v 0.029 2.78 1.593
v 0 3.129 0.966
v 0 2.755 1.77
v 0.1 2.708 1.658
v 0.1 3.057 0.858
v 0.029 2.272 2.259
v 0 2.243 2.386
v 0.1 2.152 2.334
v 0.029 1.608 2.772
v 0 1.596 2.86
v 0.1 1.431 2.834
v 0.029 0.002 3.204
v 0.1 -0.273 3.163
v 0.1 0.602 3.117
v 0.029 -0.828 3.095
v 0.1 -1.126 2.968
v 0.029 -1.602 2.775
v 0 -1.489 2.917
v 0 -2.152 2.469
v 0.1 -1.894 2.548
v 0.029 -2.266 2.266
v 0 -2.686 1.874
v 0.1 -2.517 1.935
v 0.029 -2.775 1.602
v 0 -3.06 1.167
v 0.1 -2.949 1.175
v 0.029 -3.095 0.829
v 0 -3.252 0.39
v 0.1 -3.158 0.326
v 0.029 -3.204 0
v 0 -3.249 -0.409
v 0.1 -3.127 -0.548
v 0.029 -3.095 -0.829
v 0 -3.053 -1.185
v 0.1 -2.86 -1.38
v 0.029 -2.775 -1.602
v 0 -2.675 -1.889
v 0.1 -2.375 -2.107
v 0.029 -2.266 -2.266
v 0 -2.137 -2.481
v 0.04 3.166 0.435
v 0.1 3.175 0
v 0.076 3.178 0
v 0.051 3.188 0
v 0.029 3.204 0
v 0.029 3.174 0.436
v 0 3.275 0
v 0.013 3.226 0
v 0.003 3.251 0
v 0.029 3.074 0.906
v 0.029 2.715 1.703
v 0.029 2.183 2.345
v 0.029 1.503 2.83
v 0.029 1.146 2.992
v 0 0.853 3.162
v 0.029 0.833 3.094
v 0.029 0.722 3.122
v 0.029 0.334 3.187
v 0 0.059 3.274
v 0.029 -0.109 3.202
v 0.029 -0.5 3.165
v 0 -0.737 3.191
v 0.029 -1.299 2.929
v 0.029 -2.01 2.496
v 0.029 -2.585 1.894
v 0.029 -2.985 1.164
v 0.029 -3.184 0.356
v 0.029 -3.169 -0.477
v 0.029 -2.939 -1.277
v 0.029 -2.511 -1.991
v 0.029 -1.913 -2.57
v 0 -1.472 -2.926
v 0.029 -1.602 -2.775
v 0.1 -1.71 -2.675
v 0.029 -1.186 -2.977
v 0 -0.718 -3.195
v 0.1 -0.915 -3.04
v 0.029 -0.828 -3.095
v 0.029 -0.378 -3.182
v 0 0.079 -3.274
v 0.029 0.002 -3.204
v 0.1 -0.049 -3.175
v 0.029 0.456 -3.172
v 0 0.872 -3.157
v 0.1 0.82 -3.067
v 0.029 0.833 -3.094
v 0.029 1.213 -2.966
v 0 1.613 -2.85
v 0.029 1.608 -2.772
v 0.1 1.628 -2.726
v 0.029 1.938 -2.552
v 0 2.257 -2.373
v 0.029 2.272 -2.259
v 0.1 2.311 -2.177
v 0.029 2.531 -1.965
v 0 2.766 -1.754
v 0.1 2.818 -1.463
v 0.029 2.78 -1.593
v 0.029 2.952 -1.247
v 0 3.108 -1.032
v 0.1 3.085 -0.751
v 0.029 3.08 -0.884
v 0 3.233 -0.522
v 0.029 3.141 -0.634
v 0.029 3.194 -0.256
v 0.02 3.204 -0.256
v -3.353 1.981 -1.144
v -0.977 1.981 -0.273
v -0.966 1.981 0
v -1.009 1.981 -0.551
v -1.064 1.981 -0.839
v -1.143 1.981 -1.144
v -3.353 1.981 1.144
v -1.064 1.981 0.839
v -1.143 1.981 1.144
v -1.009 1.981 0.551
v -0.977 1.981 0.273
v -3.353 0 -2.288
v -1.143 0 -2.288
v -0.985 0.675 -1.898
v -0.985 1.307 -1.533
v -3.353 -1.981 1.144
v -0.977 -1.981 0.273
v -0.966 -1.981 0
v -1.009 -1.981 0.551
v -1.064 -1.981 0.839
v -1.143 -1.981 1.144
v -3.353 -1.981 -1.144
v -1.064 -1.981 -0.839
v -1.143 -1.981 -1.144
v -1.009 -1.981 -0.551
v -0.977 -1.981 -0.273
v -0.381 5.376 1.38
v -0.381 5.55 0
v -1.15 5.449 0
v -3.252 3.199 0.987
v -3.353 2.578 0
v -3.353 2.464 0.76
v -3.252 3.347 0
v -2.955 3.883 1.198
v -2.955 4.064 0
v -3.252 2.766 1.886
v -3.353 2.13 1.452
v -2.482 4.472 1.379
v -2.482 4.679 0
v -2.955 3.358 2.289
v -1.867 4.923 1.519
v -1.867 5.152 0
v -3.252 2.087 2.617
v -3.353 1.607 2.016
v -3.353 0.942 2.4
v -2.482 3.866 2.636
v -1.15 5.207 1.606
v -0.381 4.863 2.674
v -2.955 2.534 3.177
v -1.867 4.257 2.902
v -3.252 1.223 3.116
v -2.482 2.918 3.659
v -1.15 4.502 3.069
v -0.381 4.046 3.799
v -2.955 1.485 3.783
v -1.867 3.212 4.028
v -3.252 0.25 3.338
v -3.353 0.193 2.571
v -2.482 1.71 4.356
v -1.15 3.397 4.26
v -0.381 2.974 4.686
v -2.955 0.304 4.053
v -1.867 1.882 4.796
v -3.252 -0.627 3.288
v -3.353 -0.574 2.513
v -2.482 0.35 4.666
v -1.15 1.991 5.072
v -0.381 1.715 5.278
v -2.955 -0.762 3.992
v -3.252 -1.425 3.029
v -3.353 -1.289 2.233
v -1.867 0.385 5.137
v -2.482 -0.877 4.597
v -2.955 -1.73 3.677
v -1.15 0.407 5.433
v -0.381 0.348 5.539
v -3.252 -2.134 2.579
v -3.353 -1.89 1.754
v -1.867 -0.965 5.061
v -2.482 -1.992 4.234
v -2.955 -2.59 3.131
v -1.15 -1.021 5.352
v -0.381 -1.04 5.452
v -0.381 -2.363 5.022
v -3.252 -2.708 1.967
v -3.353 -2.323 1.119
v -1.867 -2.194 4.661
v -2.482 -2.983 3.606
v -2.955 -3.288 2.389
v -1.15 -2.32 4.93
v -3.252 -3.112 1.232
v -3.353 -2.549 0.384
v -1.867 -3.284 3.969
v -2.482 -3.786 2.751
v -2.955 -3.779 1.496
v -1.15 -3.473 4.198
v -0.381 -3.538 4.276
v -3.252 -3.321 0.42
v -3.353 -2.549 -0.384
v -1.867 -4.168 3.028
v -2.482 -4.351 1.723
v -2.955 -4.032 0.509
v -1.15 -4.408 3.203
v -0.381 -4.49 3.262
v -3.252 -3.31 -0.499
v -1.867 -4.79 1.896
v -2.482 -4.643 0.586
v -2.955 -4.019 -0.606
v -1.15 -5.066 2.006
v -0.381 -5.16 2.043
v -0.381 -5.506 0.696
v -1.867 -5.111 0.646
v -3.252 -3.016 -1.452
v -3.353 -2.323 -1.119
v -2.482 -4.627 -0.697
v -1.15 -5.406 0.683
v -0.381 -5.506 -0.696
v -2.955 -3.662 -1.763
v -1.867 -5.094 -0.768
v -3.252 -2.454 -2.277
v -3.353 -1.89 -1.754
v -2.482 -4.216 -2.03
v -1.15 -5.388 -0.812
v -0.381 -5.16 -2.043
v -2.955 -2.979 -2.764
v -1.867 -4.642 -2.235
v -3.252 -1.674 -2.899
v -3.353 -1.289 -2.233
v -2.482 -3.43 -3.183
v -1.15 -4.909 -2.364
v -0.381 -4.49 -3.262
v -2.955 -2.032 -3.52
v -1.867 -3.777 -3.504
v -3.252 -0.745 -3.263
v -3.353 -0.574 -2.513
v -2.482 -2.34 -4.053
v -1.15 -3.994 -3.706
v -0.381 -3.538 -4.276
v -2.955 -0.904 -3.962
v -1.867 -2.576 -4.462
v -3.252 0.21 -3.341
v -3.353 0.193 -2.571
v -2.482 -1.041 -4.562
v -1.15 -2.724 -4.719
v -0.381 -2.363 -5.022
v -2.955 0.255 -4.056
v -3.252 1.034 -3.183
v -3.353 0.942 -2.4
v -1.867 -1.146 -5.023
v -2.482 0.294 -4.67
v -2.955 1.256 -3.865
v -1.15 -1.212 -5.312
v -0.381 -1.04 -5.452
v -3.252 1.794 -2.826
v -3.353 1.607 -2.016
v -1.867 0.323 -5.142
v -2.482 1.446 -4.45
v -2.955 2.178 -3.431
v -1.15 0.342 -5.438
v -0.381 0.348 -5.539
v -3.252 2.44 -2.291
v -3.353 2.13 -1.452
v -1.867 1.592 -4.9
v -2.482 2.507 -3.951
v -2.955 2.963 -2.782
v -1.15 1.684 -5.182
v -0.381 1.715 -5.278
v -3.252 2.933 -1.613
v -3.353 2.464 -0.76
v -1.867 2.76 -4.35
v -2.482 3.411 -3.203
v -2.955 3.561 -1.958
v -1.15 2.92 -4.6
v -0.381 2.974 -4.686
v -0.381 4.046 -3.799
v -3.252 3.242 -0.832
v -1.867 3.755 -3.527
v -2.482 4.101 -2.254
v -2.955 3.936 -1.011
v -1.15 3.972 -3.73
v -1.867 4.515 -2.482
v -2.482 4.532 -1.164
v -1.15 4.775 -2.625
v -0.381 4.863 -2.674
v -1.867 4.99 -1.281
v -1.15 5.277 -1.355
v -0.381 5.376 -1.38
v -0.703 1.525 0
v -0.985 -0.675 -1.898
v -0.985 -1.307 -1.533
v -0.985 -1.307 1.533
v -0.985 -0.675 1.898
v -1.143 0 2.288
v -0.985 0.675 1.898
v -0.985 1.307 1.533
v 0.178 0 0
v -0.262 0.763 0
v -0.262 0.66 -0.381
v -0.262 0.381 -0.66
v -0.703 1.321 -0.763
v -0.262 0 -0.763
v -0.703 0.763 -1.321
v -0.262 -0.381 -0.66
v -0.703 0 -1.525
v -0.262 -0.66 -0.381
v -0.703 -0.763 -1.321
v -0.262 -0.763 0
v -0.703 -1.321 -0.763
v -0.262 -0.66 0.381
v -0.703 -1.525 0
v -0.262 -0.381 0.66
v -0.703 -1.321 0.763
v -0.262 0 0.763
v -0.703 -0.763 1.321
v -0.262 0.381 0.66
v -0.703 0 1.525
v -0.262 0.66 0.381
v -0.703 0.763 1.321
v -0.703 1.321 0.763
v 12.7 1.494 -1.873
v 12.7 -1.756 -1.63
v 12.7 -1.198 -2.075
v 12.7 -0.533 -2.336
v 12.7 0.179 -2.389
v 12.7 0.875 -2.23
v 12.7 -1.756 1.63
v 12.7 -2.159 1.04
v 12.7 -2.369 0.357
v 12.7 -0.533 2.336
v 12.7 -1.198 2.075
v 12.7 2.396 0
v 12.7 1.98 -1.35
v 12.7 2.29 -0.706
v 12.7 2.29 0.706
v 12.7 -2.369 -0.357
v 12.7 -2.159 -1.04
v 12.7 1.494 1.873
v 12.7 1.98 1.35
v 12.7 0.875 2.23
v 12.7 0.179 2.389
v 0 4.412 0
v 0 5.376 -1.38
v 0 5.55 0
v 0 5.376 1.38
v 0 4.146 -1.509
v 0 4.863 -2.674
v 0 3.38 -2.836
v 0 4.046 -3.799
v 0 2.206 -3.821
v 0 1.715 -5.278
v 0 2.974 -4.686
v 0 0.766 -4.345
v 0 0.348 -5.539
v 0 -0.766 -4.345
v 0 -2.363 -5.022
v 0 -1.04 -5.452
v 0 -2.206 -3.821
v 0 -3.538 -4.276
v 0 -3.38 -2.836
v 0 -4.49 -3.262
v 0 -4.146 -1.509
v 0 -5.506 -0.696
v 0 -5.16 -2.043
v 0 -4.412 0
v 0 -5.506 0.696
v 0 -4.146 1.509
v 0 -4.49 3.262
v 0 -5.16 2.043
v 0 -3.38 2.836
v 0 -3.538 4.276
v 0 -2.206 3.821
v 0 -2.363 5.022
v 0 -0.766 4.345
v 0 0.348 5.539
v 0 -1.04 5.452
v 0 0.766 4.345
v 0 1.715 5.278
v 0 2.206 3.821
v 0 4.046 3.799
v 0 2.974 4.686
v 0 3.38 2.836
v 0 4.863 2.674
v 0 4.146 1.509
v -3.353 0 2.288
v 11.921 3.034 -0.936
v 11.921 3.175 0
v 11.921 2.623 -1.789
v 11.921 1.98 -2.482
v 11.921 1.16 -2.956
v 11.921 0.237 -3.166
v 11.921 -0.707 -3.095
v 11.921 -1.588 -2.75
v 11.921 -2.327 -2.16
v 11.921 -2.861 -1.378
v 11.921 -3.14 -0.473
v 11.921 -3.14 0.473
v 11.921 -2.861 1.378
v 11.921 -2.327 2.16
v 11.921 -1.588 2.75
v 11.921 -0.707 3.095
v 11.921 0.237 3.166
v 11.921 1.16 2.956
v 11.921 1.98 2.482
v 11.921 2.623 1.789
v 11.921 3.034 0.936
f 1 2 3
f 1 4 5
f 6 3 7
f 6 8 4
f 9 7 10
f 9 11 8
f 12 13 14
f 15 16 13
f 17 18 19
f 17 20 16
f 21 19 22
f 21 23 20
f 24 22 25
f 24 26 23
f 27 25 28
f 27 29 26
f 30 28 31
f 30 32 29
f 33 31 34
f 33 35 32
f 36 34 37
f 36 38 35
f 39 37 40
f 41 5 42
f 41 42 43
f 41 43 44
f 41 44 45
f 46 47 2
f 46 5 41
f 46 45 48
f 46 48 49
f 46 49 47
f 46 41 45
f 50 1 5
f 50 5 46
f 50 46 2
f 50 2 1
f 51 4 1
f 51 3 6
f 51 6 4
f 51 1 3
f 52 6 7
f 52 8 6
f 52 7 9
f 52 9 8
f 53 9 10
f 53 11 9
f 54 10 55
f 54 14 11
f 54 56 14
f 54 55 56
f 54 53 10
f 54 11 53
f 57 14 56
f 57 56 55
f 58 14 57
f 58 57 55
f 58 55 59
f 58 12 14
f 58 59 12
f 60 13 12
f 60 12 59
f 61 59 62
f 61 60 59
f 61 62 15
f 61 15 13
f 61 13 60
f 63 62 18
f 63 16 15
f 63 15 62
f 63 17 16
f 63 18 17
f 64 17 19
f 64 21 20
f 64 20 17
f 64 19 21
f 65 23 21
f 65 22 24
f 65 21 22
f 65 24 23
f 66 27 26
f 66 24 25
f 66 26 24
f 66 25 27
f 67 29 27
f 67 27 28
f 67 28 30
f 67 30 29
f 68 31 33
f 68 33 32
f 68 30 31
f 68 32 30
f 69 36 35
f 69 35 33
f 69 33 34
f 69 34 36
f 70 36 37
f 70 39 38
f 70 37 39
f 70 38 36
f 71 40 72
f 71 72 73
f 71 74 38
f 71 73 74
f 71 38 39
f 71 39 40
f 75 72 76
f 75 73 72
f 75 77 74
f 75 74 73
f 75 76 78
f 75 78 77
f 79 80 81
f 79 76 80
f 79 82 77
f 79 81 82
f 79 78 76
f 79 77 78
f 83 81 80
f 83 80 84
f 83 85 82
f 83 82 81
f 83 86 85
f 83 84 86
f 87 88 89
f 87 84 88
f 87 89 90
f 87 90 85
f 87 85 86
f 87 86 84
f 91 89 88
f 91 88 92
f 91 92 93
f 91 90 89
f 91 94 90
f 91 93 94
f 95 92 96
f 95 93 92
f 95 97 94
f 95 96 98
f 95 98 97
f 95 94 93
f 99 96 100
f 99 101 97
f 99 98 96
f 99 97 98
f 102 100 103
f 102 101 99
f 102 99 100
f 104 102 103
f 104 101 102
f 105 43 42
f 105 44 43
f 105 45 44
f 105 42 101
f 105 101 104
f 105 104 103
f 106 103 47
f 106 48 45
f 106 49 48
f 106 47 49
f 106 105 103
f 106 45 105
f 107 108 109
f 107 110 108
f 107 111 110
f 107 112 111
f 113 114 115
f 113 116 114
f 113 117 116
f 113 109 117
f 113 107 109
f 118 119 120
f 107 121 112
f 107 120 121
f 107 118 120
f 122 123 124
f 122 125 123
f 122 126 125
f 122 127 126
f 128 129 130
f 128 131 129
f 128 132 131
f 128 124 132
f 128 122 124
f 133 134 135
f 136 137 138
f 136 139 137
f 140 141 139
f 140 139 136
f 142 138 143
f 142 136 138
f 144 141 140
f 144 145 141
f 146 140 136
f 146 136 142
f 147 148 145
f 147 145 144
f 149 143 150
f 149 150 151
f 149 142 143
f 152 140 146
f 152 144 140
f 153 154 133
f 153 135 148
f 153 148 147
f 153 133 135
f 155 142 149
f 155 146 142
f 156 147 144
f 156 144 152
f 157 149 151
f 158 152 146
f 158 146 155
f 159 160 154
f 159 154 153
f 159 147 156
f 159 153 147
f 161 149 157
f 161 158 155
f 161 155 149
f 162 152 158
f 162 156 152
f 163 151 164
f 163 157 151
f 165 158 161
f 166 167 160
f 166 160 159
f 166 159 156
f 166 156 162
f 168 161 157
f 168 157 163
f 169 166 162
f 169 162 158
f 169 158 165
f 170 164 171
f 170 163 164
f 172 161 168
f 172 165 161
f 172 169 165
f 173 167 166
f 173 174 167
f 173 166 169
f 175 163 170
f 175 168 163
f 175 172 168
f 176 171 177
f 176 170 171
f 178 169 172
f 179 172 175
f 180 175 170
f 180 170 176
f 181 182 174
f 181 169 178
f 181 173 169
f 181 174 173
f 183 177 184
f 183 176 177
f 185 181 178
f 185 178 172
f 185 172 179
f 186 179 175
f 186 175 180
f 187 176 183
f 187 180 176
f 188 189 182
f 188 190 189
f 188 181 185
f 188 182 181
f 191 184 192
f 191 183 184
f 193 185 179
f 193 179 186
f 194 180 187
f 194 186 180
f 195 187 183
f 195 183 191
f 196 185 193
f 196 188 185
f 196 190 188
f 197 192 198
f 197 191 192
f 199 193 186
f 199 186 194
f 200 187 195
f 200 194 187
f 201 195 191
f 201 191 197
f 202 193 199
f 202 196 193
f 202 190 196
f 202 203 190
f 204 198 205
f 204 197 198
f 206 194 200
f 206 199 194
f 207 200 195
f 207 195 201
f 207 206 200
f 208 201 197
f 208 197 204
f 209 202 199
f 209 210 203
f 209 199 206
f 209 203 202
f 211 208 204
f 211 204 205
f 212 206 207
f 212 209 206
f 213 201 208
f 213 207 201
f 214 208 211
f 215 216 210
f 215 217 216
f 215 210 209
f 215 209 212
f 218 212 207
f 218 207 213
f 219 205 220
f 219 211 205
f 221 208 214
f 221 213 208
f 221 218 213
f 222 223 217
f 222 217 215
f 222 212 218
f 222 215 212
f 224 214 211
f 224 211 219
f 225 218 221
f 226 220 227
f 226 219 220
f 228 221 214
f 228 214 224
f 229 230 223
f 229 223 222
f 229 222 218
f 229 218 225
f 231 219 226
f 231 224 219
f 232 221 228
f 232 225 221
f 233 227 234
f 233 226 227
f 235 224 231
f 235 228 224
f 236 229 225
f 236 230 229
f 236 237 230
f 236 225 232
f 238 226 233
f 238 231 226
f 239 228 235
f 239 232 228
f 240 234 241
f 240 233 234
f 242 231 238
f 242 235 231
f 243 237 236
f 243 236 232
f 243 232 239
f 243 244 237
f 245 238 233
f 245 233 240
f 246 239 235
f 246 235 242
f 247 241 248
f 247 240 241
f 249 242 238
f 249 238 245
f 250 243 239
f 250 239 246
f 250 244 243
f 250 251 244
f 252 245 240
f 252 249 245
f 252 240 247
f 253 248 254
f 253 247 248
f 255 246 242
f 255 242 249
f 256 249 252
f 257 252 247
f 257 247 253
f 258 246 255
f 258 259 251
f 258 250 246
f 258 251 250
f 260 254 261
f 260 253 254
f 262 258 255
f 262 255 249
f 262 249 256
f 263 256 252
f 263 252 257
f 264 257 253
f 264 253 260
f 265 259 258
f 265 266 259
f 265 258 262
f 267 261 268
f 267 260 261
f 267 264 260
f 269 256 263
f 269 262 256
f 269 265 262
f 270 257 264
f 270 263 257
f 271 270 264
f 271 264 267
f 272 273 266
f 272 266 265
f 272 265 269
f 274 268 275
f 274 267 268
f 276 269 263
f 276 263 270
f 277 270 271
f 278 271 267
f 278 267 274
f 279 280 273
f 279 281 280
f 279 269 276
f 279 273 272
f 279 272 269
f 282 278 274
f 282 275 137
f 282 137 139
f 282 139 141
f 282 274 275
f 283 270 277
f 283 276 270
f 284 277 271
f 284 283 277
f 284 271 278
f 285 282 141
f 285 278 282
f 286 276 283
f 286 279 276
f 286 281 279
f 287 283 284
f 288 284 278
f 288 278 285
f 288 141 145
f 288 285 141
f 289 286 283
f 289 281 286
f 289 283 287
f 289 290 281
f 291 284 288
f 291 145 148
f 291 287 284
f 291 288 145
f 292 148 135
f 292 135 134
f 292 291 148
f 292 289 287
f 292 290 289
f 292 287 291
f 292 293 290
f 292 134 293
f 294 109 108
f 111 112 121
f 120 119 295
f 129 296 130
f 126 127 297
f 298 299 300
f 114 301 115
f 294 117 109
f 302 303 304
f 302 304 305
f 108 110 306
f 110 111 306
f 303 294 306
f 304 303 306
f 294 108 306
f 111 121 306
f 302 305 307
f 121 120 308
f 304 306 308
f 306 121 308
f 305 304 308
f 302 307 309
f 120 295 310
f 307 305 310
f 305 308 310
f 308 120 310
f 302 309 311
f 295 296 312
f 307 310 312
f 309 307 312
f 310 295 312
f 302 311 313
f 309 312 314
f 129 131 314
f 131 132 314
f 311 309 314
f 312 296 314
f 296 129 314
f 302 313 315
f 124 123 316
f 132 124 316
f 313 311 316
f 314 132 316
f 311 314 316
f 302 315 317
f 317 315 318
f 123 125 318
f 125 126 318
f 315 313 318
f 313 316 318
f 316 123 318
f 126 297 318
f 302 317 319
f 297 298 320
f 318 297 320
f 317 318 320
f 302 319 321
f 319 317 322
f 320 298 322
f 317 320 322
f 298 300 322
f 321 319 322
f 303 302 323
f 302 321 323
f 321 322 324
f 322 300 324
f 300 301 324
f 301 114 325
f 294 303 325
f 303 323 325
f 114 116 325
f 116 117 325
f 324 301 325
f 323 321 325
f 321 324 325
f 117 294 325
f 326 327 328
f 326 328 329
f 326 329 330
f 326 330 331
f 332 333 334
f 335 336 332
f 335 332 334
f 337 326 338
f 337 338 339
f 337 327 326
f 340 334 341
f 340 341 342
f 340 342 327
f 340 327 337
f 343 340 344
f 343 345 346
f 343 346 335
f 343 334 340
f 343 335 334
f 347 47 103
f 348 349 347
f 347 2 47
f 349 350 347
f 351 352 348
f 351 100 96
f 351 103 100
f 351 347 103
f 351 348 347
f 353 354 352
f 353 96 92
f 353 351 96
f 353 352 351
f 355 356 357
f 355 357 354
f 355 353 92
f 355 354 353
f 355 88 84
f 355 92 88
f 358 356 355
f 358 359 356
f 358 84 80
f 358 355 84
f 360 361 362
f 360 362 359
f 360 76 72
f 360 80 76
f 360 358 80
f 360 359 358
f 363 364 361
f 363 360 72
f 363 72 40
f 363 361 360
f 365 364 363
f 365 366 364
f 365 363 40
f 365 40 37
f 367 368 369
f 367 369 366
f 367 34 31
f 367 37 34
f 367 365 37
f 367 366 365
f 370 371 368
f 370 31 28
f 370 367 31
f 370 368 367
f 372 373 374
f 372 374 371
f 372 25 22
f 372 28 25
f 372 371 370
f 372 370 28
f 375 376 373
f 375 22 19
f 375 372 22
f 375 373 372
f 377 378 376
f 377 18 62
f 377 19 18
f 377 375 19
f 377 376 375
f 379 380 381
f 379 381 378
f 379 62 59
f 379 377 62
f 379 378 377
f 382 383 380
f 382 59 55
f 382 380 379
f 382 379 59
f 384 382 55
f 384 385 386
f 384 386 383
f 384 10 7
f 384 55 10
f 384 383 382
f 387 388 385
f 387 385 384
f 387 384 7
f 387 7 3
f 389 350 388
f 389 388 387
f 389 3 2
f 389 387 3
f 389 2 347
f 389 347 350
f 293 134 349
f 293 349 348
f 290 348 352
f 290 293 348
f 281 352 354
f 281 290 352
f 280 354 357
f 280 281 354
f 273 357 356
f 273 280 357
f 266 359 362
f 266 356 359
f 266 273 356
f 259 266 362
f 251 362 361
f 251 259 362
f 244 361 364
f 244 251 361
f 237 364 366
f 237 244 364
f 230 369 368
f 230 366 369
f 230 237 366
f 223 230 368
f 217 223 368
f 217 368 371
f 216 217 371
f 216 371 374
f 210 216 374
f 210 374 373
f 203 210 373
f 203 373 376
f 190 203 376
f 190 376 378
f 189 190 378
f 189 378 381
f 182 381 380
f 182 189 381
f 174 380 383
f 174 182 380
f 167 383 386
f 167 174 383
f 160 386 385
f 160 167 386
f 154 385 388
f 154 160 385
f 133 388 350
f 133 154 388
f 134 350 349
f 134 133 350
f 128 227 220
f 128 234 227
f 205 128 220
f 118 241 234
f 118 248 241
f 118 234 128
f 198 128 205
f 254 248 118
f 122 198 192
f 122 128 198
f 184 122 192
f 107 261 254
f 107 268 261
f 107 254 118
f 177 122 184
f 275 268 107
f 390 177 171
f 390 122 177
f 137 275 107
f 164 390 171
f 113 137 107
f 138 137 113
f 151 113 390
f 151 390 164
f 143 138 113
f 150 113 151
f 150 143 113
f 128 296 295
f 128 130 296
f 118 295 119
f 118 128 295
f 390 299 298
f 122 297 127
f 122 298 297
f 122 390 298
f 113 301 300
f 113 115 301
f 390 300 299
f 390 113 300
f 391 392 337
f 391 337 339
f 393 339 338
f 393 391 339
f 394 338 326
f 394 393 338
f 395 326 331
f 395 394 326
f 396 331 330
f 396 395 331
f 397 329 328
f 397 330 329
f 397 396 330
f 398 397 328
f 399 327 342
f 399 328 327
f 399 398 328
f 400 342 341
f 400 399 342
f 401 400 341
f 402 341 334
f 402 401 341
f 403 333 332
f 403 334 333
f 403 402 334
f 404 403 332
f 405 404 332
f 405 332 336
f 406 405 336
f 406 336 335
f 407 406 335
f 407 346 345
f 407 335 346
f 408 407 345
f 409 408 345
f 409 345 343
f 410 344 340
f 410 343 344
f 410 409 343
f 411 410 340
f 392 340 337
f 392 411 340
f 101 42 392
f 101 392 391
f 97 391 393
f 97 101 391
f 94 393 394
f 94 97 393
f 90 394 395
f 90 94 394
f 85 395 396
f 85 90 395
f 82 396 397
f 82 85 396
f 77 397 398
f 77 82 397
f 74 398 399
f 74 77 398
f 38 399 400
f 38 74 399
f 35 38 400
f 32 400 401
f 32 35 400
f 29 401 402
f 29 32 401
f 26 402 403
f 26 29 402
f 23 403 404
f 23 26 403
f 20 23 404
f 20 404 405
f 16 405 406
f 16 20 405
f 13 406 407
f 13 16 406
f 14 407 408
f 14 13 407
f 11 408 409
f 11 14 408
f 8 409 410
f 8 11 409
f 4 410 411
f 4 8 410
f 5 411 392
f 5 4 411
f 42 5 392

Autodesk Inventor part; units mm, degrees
ref_plane "YZ Plane" through (0, 0, 0) normal (1, 0, 0) x (0, 1, 0)
ref_plane "XZ Plane" through (0, 0, 0) normal (0, 1, 0) x (-1, 0, 0)
sketch "Sketch1" plane through (0, 0, 0) normal (0, 0, 1) x (1, 0, 0)
  line L0 (0.1778, 0) -> (12.7, 0)
  line L1 (12.7, 0) -> (12.7, 3.175)
  line L2 (12.7, 3.175) -> (2.5402, 3.175)
  line L3 (2.5402, 3.175) -> (0.0001, 3.175)
  line L4 (0.0001, 3.175) -> (0, 3.175)
  line L5 (0, 3.175) -> (0, 5.5499)
  line L6 (0, 5.5499) -> (-3.3528, 5.5499)
  line L7 (-3.3528, 5.5499) -> (-3.3528, 2.2877)
  line L8 (-3.3528, 2.2877) -> (-1.143, 2.2877)
  line L9 (-1.143, 2.2877) -> (0.1778, 0)
  line L10 (-6.5634, 0) -> (15.9106, 0) projected
  line L11 (0, -1.11) -> (0, 6.6599) projected
  line L12 (2.5402, 3.175) -> (0, 3.175) construction
  dimension "d1" = 10.1598
  dimension "d2" = 2.5401
  dimension "d3" = 3.3528
  dimension "d4" = 2.2098
  dimension "d5" = 60
  dimension "d6" = 6.35
  dimension "d7" = 6.35
  dimension "d8" = 4.5754
  dimension "d9" = 11.0998
  dimension "d26" = 12.7
revolve "Body" add sketch "Sketch1" angle 360 about axis through (0.1778, 0, 0) along (1, 0, 0) contours L9 L11 L3 L2 L1 L0 | L9 L8 L7 L6 L5 L11
sketch "Sketch2" plane through (-3.3528, 0, 0) normal (-1, 0, 0) x (0, 0, 1)
  circle A0 centre (0, 0) radius 2.2877 projected
  line L0 (0, -7.7699) -> (0, 7.7699) projected
  line L1 (-7.7699, 0) -> (7.7699, 0) projected
  line L2 (2.2877, 0) -> (1.1438, -1.9812)
  line L3 (1.1438, -1.9812) -> (-1.1438, -1.9812)
  line L4 (-1.1438, -1.9812) -> (-2.2877, 0)
  line L5 (-2.2877, 0) -> (-1.1438, 1.9812)
  line L6 (-1.1438, 1.9812) -> (1.1438, 1.9812)
  line L7 (1.1438, 1.9812) -> (2.2877, 0)
  point P0 (0, 0)
extrude "Slot" add sketch "Sketch2" against normal up to next contours L7 A0 | A0 L2 | L6 L0 A0 | A0 L0 L3 | L0 L6 A0 | A0 L3 L0 | L4 A0 | A0 L5
fillet "Fillet1" radius 2.9718 1 edges at (-3.3528, -5.5499, 0)
thread "Thread" size "1/4-20 UNC" class "2A" standard "ANSI Unified Screw Threads" length 10.1598
chamfer "Chamfer1" distance 0.779 distance2 0.779 1 edges at (12.7, -3.175, 0) measured on face at (12.7, -1.2091, -0.9896)
ref_plane "Work Plane1" through (29, 0, 0) normal (0, -1, 0) x (1, 0, 0)
fillet "Fillet2" radius 0.1 1 edges at (0.0001, -3.175, 0)
equation "\"d1\" = GEL"
equation "\"d3\" = KOH"
equation "\"d4\" = INTI"
equation "\"d6\" = GD"
equation "\"d7\" = BDM"
equation "\"d8\" = 1.1547 * SW"
equation "\"d9\" = KOD"
equation "\"d26\" = NLG"
equation "\"d30\" = R"
equation "\"d17\" = RR"
equation "\"d13\" = GEL"
equation "\"d15\" = -0.5 * SPD + 0.5 * GD"
equation "\"d16\" = GUL"
equation "\"GD\" = NND"
equation "\"NLG\" = 12.7"
equation "\"GEL\" = 10.1598"
equation "\"KOD\" = 11.0998"
equation "\"KOH\" = 3.3528"
equation "\"INTI\" = 2.2098"
equation "\"GAL\" = 2.54"
equation "\"GUL\" = 0.77902"
equation "\"BDM\" = NND"
equation "\"SW\" = 3.9624"
equation "\"RR\" = 2.9718"
equation "\"SPD\" = 4.79196"
equation "\"R\" = 0.1"
equation "\"TOA\" = 30deg"
equation "\"GD1\" = SPD"
equation "\"THREADDIA\" = 6.35"
equation "\"KOH1\" = 0.7874"
equation "\"NND\" = 6.35"
equation "\"E0\" = 4.57657"
properties part number "am-1039" material "Steel, Mild"
